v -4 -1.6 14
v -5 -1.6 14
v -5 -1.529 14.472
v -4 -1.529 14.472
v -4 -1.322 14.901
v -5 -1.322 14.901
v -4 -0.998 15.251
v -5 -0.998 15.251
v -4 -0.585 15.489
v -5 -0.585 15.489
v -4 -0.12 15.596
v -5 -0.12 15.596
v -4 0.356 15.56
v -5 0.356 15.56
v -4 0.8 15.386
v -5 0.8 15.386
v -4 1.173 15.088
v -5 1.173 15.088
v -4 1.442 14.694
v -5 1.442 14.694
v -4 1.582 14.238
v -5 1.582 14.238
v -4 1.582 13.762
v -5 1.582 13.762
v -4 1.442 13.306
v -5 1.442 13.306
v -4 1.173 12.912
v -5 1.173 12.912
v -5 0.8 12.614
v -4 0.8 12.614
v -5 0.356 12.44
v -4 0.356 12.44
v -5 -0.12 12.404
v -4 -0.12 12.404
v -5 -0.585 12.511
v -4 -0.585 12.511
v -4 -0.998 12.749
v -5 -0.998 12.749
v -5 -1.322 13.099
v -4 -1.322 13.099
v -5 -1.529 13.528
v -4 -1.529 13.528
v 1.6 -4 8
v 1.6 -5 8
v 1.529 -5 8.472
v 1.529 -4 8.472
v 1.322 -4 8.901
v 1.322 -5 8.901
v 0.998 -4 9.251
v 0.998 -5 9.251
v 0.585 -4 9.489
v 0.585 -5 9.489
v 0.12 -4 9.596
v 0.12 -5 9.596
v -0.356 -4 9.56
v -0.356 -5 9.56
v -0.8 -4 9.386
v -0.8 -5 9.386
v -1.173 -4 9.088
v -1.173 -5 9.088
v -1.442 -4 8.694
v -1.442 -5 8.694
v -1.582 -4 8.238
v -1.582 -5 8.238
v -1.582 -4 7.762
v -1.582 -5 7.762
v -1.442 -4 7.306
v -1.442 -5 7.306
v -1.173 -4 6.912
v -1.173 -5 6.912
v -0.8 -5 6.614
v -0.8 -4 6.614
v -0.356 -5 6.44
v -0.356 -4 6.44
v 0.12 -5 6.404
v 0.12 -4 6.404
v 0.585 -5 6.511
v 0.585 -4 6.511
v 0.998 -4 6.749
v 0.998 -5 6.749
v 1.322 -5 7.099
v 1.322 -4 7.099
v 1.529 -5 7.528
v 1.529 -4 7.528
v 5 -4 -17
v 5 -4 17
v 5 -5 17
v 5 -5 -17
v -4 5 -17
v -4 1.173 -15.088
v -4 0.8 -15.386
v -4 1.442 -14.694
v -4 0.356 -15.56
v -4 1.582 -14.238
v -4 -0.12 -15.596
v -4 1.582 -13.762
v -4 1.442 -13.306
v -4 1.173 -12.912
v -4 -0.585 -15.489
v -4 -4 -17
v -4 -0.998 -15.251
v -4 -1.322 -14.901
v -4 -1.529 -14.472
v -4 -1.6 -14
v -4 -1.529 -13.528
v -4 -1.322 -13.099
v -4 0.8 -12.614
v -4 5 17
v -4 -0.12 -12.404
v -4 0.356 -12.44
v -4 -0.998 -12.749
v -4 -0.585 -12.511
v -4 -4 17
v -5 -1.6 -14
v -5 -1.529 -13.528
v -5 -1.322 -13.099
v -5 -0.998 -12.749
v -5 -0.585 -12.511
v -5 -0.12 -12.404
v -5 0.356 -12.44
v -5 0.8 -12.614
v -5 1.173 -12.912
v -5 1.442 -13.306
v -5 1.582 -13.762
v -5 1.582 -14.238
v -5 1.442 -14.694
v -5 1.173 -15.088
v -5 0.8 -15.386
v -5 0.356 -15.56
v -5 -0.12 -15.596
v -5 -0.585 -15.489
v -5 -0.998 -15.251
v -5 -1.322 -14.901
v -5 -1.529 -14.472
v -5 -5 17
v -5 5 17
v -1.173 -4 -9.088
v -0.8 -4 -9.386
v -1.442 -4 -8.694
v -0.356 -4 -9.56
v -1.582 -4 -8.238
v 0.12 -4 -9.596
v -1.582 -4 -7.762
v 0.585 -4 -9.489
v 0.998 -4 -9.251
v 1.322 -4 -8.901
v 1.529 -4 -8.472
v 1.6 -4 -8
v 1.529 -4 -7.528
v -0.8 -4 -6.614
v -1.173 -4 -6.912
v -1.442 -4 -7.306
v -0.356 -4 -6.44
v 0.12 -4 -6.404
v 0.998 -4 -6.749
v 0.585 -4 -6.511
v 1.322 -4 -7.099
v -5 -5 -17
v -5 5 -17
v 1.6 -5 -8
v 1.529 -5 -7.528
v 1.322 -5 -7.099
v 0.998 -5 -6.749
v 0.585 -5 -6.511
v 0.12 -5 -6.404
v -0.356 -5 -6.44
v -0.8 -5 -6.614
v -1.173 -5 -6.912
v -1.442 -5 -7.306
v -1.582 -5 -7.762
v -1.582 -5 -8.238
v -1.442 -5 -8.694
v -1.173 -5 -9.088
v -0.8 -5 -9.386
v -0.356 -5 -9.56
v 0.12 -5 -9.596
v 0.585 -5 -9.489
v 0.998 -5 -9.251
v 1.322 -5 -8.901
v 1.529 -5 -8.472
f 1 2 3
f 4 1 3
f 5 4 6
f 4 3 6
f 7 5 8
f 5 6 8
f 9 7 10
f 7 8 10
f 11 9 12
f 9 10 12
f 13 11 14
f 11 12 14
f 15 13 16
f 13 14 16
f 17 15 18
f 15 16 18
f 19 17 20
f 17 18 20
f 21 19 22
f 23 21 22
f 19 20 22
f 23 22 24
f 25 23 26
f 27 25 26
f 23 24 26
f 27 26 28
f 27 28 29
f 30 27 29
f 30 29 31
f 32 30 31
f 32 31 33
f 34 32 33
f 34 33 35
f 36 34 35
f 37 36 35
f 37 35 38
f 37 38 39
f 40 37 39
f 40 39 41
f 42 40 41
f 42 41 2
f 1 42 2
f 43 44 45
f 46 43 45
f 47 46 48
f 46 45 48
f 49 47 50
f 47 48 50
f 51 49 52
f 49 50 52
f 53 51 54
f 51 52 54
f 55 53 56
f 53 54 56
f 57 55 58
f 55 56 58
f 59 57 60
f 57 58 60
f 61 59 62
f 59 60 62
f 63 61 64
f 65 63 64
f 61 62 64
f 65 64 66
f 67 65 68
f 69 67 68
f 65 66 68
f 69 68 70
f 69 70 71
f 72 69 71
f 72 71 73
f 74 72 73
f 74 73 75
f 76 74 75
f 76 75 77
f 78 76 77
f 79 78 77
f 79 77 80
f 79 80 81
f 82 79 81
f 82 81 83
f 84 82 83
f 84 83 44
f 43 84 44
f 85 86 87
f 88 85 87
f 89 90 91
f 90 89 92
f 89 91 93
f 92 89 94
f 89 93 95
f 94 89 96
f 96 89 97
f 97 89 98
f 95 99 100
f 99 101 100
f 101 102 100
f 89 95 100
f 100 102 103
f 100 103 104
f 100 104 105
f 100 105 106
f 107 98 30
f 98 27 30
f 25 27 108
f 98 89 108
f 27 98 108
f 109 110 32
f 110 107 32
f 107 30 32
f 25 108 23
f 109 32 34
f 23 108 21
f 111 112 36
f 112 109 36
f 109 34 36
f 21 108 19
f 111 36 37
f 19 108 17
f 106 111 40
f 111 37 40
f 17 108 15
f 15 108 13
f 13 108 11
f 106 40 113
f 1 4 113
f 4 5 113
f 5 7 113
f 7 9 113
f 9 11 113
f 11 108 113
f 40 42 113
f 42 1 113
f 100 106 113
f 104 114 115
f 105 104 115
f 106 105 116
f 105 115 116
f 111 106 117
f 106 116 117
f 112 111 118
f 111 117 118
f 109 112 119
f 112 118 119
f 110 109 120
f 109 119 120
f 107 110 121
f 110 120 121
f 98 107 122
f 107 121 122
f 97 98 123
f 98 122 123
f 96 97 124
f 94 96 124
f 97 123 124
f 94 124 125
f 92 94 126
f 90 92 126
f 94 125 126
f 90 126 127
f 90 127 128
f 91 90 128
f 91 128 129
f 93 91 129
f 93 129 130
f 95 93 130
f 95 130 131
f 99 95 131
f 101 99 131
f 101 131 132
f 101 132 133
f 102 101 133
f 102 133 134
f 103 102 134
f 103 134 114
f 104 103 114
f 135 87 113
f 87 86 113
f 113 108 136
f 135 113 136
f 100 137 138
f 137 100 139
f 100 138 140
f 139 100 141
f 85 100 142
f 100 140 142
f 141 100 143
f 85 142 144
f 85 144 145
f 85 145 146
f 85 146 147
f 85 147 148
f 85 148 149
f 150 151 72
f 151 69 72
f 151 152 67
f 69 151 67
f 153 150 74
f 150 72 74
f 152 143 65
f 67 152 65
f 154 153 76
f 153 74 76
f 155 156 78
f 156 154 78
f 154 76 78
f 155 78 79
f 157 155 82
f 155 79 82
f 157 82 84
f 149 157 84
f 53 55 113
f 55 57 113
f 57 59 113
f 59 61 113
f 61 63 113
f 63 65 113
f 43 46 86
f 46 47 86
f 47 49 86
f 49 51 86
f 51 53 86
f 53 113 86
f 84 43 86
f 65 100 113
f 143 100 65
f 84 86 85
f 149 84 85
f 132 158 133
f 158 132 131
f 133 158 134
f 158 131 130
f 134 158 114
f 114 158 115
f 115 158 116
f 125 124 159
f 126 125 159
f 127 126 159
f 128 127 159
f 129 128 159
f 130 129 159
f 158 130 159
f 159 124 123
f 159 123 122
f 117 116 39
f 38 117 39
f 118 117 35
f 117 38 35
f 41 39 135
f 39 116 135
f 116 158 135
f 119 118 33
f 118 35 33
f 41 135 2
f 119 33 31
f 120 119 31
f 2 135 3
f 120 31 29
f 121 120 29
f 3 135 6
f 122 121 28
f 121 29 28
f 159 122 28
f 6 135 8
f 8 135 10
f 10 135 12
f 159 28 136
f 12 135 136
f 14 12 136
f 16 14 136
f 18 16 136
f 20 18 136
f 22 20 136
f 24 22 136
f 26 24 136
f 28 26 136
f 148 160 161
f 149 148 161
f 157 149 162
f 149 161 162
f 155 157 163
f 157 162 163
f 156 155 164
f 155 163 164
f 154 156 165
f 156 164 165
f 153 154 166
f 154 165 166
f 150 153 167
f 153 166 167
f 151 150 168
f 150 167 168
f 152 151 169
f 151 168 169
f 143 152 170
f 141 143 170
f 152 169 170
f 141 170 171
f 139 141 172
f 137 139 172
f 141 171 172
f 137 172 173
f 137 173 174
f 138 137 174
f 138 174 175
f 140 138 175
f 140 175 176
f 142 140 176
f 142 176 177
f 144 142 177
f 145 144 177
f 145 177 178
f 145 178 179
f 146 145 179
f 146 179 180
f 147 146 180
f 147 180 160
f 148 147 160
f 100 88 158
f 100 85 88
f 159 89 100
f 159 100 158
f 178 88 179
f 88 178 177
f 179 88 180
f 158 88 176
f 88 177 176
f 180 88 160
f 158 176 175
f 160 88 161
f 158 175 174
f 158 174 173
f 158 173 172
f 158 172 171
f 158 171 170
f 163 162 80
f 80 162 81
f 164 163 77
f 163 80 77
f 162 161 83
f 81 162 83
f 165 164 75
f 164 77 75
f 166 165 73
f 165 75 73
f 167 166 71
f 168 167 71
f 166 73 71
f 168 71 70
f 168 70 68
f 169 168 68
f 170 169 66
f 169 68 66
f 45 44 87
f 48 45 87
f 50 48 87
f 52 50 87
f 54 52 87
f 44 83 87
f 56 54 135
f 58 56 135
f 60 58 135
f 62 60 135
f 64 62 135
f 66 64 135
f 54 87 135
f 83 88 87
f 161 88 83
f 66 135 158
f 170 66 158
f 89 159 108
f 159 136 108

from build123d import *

# Parameters (mm, degrees)
EXTRUDE_1_DEPTH     = 17
SKETCH_2_R          = 1.6
CUT_EXTRUDE_1_DEPTH = 21.346989949
SKETCH_3_R          = 1.6
CUT_EXTRUDE_2_DEPTH = 21.346989949


with BuildPart() as part:
    # ｽｹｯﾁ1 → 押し出し-薄板1 (new, symmetric)
    with BuildSketch(Plane.XY):
        Polygon((5, -5), (-5, -5), (-5, 5), (-4, 5), (-4, -4), (5, -4), align=None)
    extrude(amount=EXTRUDE_1_DEPTH, both=True)

    # ｽｹｯﾁ2 → ｶｯﾄ - 押し出し1 (cut, through all)
    with BuildSketch(Plane.ZY.offset(5)):
        with Locations(Location((-14, 0, 0), (0, 0, 270))):
            Circle(SKETCH_2_R)
        with Locations(Location((14, 0, 0), (0, 0, 270))):
            Circle(SKETCH_2_R)
    extrude(amount=-CUT_EXTRUDE_1_DEPTH, mode=Mode.SUBTRACT)

    # ｽｹｯﾁ3 → ｶｯﾄ - 押し出し2 (cut, through all)
    with BuildSketch(Plane.XZ.offset(5)):
        with Locations((0, -8)):
            Circle(SKETCH_3_R)
        with Locations((0, 8)):
            Circle(SKETCH_3_R)
    extrude(amount=-CUT_EXTRUDE_2_DEPTH, mode=Mode.SUBTRACT)


solid = part.part
